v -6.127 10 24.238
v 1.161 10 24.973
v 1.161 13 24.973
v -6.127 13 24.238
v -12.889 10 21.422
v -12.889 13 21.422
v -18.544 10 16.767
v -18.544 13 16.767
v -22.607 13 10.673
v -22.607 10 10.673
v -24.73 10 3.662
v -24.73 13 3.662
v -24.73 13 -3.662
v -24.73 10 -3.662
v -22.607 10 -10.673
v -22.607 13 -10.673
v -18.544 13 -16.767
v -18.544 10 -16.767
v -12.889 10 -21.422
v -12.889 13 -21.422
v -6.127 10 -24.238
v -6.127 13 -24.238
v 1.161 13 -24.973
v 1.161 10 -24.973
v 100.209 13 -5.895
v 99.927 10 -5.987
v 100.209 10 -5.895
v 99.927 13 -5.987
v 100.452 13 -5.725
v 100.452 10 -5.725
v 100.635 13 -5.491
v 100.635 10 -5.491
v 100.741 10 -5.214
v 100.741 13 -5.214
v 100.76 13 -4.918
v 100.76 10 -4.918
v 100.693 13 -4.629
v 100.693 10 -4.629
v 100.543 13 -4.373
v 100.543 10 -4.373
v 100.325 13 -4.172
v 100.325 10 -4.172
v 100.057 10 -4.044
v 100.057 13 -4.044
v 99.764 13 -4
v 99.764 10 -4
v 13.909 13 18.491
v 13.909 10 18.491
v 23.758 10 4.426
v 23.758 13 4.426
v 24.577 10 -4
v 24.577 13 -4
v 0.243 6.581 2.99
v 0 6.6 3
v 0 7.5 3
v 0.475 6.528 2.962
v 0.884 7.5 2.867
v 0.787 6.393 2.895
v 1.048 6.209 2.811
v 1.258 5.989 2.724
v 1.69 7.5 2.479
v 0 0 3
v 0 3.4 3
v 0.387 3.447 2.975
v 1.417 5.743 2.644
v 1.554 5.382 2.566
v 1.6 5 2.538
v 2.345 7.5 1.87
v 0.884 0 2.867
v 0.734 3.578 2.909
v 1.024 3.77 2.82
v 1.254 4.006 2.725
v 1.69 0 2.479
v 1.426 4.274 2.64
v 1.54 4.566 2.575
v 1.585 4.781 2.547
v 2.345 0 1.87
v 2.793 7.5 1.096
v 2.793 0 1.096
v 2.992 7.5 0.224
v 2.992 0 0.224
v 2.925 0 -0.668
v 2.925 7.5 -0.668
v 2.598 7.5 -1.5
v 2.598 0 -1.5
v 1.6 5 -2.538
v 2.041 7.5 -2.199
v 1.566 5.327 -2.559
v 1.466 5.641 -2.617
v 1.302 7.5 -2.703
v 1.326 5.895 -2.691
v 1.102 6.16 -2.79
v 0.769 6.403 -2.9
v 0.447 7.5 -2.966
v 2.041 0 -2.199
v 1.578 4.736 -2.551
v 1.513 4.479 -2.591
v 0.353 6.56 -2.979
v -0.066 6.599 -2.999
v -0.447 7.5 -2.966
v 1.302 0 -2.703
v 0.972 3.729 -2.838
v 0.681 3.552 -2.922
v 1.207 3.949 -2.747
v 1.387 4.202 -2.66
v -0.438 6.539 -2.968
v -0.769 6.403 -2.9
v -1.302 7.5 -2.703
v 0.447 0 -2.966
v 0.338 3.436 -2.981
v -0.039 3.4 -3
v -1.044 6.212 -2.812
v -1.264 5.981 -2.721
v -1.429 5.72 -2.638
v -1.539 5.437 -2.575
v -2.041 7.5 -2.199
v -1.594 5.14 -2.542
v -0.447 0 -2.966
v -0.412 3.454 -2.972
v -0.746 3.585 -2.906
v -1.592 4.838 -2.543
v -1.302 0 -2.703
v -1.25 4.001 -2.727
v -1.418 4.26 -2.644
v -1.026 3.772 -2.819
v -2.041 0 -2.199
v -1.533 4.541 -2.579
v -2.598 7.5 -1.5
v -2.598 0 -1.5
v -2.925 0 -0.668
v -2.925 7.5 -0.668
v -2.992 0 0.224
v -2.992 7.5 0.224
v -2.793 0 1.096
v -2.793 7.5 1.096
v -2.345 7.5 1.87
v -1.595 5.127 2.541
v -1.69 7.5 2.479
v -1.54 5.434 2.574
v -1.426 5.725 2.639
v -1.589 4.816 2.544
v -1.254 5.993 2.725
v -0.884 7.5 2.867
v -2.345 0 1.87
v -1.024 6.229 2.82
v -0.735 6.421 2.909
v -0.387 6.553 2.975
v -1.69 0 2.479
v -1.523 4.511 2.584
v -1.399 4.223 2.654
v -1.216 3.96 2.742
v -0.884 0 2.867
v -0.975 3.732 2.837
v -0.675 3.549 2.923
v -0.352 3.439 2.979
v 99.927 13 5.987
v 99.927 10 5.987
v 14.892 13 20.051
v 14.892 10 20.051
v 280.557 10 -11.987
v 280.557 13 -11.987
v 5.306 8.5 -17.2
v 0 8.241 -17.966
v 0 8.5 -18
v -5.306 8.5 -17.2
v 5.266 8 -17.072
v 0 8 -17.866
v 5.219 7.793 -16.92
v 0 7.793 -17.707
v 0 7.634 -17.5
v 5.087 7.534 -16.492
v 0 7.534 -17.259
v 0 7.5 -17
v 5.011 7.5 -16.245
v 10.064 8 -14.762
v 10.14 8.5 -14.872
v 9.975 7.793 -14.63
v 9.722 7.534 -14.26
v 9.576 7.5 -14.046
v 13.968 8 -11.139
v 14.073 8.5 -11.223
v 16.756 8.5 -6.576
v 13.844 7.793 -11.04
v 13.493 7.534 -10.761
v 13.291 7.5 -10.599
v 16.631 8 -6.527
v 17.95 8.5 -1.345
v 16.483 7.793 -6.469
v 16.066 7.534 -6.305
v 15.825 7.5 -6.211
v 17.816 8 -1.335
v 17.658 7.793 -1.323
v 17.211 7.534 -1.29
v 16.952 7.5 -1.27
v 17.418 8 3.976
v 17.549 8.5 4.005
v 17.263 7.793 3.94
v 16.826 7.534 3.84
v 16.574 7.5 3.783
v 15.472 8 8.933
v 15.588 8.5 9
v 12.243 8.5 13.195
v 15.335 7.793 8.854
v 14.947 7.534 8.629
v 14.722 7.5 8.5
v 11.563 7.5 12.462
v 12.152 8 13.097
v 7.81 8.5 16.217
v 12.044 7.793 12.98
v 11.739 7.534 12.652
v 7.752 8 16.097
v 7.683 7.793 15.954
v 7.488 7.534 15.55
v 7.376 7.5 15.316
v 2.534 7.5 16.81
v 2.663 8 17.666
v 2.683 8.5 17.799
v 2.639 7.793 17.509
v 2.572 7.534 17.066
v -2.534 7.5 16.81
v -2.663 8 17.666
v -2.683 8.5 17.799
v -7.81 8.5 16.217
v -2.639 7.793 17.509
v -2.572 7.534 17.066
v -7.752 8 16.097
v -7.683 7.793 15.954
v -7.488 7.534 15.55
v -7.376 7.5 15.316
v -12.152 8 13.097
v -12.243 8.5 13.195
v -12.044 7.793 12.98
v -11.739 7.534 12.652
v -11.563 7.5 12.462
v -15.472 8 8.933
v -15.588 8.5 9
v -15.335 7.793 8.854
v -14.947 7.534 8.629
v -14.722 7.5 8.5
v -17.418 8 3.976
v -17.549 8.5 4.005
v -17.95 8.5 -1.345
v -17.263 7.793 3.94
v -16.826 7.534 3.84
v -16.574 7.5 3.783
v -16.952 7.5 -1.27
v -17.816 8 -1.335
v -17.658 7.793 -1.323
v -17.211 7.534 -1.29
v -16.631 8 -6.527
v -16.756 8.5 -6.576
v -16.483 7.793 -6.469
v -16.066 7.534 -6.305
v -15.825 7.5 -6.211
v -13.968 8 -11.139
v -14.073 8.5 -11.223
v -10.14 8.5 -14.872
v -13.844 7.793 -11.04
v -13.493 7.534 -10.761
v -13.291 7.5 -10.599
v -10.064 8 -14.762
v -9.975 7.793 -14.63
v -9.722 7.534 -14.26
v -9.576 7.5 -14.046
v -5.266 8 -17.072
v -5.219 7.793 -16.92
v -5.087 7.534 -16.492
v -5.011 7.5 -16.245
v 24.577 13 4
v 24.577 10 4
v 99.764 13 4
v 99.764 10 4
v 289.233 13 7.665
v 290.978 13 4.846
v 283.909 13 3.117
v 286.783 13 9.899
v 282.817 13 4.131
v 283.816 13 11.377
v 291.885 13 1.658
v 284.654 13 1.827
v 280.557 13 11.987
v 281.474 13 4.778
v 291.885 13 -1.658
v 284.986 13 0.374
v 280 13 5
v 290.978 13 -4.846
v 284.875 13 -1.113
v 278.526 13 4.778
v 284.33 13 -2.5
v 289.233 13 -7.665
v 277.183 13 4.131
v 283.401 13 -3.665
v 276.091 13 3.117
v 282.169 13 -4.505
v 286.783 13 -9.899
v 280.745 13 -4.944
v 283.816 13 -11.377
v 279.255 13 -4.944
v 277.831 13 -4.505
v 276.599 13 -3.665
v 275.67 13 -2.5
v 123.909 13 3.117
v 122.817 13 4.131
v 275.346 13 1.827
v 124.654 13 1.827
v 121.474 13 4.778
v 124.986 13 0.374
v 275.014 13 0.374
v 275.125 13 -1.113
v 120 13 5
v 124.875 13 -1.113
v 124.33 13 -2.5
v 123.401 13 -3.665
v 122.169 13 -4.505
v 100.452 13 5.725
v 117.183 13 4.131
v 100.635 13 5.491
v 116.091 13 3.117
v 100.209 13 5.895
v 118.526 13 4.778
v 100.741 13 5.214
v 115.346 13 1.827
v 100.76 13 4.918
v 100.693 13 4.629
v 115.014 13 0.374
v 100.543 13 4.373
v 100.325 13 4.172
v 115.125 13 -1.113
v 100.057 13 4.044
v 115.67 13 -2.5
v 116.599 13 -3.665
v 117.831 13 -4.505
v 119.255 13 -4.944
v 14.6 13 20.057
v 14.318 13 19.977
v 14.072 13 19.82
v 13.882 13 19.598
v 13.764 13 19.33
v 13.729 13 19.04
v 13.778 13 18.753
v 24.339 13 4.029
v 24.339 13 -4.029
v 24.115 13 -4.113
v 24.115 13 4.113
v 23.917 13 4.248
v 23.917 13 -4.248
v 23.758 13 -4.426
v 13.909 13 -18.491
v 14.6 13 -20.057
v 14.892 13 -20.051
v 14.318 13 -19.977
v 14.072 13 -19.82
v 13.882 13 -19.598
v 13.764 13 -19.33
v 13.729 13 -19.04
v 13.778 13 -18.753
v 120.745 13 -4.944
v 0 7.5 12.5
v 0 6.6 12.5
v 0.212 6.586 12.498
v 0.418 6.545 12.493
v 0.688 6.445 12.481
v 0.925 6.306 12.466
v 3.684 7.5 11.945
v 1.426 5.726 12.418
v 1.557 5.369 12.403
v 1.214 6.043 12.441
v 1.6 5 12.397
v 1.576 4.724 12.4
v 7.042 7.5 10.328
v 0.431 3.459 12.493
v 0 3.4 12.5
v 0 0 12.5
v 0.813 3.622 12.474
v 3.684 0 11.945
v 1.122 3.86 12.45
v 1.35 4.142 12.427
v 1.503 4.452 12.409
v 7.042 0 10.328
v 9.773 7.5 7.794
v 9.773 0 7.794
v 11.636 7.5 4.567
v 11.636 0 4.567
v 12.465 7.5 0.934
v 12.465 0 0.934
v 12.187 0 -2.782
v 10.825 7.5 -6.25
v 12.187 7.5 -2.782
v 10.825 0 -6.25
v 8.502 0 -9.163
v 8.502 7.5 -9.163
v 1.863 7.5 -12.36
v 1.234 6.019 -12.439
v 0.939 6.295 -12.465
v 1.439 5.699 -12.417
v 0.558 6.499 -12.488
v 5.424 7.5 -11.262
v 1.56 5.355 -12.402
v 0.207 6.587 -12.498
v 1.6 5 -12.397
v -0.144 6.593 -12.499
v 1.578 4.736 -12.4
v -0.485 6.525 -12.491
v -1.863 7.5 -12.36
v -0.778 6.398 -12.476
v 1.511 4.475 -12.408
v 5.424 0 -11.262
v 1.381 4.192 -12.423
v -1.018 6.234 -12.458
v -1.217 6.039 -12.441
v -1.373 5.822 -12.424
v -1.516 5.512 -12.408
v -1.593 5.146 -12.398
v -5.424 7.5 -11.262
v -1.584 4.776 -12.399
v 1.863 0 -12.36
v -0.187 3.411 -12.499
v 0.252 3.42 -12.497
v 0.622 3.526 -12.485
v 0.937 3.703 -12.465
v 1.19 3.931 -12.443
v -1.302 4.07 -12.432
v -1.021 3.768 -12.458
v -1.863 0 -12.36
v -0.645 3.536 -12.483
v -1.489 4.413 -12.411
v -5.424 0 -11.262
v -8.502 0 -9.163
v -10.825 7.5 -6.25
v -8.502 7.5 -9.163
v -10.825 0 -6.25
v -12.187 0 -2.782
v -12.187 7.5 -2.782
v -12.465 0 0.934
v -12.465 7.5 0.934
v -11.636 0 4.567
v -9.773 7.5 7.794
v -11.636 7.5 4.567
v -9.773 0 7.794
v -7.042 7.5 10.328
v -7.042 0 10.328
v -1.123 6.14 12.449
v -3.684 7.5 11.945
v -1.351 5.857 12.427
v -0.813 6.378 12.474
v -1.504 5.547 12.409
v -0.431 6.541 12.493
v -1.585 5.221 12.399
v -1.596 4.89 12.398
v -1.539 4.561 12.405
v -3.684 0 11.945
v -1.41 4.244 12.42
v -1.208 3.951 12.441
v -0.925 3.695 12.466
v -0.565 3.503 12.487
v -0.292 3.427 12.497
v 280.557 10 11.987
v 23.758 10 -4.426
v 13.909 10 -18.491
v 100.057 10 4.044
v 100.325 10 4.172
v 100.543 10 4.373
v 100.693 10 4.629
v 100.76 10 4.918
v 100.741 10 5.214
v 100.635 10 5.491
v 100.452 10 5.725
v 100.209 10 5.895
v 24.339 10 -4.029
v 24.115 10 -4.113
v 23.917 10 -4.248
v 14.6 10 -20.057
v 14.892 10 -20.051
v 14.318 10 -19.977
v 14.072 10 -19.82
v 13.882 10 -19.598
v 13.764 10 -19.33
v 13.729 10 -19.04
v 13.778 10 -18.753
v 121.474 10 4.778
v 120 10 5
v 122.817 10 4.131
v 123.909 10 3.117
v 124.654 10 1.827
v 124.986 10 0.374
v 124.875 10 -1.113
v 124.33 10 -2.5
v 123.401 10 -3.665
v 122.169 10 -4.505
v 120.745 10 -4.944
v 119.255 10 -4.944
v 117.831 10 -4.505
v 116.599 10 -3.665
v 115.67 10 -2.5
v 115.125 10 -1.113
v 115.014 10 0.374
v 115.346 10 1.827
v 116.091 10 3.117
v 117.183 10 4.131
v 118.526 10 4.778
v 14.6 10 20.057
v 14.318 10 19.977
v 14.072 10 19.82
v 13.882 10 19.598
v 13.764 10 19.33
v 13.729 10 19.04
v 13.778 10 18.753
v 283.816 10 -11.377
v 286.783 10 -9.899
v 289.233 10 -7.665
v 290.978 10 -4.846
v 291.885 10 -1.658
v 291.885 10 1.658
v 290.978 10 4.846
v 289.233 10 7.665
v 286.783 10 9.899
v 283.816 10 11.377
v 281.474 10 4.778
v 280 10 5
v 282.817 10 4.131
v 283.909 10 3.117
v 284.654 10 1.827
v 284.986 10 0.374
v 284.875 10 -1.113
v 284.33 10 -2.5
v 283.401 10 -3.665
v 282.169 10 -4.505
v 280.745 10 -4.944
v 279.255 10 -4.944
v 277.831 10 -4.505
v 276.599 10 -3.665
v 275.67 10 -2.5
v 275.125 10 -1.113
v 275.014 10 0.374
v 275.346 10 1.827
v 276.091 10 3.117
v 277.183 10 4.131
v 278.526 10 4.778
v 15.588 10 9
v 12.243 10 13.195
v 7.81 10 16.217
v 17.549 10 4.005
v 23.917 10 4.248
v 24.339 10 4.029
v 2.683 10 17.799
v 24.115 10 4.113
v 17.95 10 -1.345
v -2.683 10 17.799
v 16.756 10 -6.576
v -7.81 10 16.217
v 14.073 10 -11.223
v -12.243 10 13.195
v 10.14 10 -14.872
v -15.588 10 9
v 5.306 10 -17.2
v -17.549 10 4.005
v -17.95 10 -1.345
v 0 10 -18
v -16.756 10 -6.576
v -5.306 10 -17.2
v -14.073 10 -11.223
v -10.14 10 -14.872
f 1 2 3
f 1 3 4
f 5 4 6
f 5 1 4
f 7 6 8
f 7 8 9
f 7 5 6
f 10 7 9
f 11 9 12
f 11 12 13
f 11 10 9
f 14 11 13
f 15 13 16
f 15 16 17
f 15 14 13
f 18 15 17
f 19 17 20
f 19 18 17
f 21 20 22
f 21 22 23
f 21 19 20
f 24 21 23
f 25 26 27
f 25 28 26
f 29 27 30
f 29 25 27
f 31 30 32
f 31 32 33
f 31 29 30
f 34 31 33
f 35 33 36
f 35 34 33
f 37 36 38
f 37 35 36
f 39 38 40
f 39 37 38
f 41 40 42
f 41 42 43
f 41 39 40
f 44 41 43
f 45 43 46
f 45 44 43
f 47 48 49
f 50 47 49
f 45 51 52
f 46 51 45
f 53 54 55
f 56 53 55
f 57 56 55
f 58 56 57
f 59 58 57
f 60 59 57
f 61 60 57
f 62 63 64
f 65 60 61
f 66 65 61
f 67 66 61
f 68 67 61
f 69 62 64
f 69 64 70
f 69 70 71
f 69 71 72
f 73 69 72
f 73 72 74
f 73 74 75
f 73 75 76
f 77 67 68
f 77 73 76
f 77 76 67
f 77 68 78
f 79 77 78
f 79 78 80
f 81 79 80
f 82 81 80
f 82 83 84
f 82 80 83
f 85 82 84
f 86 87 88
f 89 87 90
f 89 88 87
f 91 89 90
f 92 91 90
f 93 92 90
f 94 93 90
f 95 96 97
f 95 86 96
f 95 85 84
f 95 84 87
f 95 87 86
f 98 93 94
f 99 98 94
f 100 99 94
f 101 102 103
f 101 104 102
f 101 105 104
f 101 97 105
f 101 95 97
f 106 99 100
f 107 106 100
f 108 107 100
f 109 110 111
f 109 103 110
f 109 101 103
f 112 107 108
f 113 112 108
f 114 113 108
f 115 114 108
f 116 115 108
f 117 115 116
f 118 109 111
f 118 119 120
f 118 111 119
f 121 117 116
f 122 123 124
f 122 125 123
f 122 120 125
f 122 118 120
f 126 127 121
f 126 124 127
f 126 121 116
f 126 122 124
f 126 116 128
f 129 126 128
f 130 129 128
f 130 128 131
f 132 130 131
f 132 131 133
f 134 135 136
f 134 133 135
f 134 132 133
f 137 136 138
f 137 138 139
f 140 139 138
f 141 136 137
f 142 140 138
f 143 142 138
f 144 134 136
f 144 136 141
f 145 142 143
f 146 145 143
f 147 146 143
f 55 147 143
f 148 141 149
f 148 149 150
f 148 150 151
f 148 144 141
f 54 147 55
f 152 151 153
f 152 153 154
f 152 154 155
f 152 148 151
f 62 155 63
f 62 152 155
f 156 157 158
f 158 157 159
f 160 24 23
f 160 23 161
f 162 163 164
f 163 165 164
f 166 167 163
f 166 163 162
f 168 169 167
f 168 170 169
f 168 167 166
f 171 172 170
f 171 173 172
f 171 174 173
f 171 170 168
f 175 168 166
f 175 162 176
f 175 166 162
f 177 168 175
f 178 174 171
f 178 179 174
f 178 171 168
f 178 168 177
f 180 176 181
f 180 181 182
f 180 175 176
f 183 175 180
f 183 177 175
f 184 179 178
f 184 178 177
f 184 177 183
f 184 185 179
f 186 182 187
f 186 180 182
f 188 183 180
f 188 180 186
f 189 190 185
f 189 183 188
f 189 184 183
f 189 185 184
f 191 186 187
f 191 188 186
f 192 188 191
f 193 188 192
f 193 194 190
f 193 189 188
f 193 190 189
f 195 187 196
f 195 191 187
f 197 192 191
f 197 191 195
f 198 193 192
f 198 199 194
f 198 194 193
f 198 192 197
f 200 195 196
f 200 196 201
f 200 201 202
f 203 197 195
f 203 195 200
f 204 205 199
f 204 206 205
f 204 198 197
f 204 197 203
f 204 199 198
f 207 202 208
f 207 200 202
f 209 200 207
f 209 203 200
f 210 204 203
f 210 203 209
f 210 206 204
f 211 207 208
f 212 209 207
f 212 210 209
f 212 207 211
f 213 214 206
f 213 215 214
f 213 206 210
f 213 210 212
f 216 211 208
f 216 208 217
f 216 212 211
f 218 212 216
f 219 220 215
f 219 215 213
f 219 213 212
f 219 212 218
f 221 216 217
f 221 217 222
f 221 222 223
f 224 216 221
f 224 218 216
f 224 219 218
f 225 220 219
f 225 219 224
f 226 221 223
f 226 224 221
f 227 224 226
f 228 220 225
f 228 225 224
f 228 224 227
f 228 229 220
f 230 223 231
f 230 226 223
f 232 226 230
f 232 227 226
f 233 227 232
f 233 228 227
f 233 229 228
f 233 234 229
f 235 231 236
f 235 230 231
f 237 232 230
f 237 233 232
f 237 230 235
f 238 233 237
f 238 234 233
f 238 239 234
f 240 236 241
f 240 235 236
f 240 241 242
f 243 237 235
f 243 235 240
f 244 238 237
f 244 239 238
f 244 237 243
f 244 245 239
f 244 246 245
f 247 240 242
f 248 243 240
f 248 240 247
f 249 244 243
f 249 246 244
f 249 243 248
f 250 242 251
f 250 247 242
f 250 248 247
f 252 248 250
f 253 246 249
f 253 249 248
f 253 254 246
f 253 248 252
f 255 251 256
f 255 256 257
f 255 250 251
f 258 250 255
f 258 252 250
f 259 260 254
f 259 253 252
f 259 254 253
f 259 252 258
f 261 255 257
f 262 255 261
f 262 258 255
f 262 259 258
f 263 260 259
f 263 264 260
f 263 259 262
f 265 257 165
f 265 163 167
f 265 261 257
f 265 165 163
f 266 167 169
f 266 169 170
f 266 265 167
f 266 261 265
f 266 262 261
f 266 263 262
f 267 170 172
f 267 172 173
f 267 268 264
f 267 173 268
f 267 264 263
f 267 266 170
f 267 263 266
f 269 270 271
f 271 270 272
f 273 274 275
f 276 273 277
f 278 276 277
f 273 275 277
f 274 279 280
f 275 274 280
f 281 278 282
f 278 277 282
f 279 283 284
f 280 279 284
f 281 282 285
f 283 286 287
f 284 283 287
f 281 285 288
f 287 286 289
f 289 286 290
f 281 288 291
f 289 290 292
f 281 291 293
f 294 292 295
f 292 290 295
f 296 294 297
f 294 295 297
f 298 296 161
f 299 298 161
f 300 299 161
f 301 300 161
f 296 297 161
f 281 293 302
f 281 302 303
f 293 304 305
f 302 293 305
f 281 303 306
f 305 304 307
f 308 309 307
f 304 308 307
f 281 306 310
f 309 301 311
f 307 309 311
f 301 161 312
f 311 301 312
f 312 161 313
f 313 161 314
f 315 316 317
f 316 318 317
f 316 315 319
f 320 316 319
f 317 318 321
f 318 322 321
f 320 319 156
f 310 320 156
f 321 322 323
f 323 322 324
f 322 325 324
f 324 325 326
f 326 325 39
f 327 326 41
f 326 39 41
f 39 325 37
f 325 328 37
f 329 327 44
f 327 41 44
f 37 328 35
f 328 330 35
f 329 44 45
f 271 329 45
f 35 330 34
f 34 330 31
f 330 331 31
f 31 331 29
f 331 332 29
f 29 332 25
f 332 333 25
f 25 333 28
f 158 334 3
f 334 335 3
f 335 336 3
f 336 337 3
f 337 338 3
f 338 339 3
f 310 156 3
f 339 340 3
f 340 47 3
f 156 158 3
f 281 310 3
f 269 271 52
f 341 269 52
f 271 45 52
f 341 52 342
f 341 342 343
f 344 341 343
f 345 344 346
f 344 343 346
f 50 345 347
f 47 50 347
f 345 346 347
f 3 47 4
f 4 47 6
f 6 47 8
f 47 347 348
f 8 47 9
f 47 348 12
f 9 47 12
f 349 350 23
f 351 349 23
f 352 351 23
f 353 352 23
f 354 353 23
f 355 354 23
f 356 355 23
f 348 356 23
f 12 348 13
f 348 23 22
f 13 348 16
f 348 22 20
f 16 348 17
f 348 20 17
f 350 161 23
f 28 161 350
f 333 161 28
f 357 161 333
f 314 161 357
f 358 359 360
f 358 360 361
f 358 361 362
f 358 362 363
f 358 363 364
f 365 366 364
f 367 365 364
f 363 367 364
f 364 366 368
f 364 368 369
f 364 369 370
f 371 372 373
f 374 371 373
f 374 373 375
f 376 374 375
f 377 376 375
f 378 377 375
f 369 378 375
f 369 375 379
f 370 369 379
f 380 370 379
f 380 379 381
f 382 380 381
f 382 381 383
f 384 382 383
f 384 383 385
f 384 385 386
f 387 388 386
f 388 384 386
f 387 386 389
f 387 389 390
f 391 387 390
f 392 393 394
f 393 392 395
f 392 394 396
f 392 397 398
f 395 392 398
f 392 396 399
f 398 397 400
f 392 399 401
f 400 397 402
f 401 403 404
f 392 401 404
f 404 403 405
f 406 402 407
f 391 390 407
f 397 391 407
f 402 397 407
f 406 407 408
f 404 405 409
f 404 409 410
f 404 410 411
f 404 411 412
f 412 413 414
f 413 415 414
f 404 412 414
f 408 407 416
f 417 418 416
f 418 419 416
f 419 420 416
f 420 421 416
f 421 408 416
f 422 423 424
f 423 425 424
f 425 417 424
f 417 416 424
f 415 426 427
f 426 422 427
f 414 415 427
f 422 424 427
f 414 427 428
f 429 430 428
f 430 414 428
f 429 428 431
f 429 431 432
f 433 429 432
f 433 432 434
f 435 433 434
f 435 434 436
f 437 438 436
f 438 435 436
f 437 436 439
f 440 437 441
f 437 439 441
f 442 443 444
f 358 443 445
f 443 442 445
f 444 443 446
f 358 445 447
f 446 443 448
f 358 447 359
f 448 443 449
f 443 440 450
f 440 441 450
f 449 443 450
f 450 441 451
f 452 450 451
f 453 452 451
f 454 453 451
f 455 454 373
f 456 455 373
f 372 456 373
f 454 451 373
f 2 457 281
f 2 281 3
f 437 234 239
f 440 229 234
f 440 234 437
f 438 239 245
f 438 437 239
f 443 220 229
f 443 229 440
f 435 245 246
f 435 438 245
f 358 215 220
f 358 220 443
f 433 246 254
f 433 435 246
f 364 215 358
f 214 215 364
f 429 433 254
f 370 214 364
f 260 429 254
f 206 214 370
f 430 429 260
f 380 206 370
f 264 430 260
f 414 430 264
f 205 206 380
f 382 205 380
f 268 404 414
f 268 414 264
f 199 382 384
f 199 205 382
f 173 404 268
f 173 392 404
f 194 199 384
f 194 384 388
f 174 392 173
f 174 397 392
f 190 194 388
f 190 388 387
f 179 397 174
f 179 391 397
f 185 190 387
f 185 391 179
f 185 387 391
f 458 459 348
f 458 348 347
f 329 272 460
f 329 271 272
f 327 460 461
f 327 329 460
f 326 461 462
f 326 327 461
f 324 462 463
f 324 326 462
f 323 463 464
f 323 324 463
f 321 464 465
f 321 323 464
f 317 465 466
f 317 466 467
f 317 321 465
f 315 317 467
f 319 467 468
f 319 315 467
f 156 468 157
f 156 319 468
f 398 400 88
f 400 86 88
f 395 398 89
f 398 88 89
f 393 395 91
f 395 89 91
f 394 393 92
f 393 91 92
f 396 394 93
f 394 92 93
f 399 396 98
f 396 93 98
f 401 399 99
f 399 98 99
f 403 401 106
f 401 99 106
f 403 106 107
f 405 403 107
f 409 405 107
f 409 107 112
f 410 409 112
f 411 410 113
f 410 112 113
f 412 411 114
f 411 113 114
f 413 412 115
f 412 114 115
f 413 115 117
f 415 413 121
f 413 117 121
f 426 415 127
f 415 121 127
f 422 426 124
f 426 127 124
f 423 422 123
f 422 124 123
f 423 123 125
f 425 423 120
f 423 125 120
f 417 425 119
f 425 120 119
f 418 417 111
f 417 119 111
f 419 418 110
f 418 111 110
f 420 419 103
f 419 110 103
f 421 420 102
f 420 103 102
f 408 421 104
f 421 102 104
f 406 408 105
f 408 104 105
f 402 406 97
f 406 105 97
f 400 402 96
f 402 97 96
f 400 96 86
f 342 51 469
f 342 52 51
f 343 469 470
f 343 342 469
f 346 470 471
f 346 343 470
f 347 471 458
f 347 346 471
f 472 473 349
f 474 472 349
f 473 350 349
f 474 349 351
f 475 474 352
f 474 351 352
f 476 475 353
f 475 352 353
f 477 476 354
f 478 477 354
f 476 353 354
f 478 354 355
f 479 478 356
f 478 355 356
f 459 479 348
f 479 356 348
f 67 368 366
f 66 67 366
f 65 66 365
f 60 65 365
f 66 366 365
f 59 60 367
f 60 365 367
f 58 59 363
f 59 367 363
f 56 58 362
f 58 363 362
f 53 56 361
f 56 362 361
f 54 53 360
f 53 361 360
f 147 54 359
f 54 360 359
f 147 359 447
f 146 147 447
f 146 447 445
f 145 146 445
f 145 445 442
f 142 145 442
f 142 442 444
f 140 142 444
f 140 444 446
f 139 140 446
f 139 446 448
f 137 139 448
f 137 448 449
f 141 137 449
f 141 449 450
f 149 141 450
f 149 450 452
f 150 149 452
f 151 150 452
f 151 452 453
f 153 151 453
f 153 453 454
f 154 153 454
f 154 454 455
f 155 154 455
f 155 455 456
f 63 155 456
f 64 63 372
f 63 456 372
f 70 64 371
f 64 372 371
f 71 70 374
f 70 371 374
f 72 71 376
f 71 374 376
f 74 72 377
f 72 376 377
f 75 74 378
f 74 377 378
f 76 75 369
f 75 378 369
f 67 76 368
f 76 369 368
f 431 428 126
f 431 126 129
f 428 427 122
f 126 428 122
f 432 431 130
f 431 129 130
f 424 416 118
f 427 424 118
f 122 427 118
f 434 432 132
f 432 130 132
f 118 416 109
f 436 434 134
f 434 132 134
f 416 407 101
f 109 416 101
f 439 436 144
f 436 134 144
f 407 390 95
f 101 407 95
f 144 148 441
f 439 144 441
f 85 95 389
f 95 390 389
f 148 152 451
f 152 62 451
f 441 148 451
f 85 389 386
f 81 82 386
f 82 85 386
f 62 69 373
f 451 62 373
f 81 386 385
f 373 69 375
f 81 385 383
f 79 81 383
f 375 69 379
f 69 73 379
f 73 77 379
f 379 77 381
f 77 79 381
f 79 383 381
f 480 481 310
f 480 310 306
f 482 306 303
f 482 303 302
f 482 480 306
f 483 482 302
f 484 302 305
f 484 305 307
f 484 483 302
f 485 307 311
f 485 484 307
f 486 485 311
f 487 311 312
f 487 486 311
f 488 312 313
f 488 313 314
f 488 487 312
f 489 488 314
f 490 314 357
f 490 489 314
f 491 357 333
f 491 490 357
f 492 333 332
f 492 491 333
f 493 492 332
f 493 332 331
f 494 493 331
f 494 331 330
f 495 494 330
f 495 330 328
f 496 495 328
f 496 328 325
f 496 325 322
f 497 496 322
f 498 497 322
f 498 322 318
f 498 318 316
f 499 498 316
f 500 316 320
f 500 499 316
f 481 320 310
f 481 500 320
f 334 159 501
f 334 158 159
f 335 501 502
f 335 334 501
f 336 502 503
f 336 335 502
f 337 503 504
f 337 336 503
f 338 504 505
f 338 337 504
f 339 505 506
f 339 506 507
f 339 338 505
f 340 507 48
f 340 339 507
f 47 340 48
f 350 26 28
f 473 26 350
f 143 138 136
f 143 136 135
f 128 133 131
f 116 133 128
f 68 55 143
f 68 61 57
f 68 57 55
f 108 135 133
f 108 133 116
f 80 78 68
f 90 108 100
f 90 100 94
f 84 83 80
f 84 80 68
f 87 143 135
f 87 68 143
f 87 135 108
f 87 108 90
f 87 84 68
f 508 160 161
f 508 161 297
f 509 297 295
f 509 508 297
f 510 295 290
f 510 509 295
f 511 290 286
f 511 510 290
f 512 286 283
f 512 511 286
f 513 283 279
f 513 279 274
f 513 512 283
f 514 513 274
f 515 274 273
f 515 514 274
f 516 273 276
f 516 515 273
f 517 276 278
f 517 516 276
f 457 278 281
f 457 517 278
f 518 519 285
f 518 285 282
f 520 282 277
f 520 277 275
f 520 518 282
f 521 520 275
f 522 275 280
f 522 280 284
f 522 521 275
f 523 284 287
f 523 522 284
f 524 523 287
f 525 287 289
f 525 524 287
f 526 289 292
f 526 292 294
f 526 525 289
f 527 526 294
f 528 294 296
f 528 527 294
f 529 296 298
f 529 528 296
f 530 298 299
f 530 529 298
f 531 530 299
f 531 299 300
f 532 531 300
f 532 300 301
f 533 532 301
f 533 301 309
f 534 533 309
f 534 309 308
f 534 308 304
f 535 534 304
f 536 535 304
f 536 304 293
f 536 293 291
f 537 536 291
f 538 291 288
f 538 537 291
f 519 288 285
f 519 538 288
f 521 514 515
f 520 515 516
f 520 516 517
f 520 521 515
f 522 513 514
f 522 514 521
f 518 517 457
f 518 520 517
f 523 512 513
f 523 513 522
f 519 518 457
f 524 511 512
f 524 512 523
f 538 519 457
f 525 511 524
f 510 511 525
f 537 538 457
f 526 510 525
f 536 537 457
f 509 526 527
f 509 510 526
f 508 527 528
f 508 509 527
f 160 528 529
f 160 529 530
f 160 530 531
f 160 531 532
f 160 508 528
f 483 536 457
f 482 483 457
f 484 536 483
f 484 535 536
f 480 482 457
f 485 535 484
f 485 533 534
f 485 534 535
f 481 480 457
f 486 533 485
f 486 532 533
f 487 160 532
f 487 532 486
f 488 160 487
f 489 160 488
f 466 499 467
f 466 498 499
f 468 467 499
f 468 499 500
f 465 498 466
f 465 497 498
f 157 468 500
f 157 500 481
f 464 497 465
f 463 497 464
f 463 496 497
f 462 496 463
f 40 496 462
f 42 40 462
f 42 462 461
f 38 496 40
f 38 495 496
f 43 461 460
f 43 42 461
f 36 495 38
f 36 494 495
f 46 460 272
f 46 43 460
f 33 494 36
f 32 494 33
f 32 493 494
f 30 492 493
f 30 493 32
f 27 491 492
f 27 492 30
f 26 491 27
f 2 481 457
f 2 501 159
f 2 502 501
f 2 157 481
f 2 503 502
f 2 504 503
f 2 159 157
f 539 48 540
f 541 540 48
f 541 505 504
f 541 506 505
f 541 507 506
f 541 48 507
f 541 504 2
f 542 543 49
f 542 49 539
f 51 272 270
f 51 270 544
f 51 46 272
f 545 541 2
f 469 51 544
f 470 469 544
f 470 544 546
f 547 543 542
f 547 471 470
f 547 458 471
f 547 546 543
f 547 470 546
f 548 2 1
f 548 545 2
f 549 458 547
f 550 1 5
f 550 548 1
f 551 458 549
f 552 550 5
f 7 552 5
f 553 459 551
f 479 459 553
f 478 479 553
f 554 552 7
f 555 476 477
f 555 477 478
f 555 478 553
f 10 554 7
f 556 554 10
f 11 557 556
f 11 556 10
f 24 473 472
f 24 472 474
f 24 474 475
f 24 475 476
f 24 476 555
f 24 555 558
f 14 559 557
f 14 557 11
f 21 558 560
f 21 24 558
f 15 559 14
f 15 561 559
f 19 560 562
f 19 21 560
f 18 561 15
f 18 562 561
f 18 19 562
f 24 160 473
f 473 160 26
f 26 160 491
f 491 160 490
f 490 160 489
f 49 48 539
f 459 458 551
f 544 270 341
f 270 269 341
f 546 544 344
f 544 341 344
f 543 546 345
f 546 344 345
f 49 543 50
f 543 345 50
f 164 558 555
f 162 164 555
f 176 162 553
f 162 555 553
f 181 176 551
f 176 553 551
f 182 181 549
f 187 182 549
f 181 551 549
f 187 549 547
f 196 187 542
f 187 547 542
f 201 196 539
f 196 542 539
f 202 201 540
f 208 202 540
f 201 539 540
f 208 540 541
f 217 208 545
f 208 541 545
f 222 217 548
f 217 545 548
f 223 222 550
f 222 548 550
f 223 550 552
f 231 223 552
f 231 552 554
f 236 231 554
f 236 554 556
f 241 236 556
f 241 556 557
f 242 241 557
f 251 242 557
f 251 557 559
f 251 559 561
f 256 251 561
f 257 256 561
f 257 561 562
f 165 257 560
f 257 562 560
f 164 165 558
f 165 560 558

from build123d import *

# Parameters (mm, degrees)
SKETCH_1_R          = 12.5
SKETCH_1_R_2        = 3
EXTRUDE_1_DEPTH     = 10
SKETCH_2_R          = 1.6
CUT_EXTRUDE_4_DEPTH = 12.5
SKETCH_3_R          = 5
EXTRUDE_2_DEPTH     = 3
SKETCH_4_R          = 18
EXTRUDE_3_DEPTH     = 2.5
FILLET_1_R          = 1
SKETCH_5_R          = 1
CUT_EXTRUDE_5_DEPTH = 3
FILLET_2_R          = 1


with BuildPart() as part:
    # 草图1 → 凸台-拉伸1 (new body)
    with BuildSketch(Plane(origin=(0, 0, 0), x_dir=(1, 0, 0), z_dir=(0, 1, 0))):
        with Locations(Location((0, 0, 0), (0, 0, 270))):
            Circle(SKETCH_1_R)
        with Locations(Location((0, 0, 0), (0, 0, 270))):
            Circle(SKETCH_1_R_2, mode=Mode.SUBTRACT)
    extrude(amount=EXTRUDE_1_DEPTH)

    # 草图2 → 切除-拉伸4 (cut, symmetric)
    with BuildSketch(Plane.XY):
        with Locations((0, 5)):
            Circle(SKETCH_2_R)
    extrude(amount=CUT_EXTRUDE_4_DEPTH, both=True, mode=Mode.SUBTRACT)

    # 草图3 → 凸台-拉伸2 (add)
    with BuildSketch(Plane(origin=(0, 10, 0), x_dir=(1, 0, 0), z_dir=(0, 1, 0))):
        with BuildLine():
            Line((1.160714286, 24.97304031), (280.557142857, 11.987059349))
            ThreePointArc((280.557142857, 11.987059349), (292, 0), (280.557142857, -11.987059349))
            Line((280.557142857, -11.987059349), (1.160714286, -24.97304031))
            ThreePointArc((1.160714286, -24.97304031), (-25, 0), (1.160714286, 24.97304031))
        make_face()
        with Locations(Location((280, 0, 0), (0, 0, 270))):
            Circle(SKETCH_3_R, mode=Mode.SUBTRACT)
        with Locations(Location((120, 0, 0), (0, 0, 270))):
            Circle(SKETCH_3_R, mode=Mode.SUBTRACT)
    extrude(amount=EXTRUDE_2_DEPTH)

    # 草图4 → 凸台-拉伸3 (add)
    with BuildSketch(Plane.XZ.offset(-10)):
        with Locations(Location((0, 0, 0), (0, 0, 270))):
            Circle(SKETCH_4_R)
    extrude(amount=EXTRUDE_3_DEPTH)

    # 圆角1
    fillet_1_edges = [part.edges().sort_by_distance(p)[0] for p in [
        (0, 7.5, 18),
    ]]
    fillet(fillet_1_edges, radius=FILLET_1_R)

    # 草图5 → 切除-拉伸5 (cut)
    with BuildSketch(Plane.XZ.offset(-10)):
        with Locations((120, 0)):
            Circle(SKETCH_5_R)
        Polygon((24.0562108, 4), (111.937742252, 4), (12.545084957, 20.439591429), align=None)
        Polygon((12.545084957, -20.439591429), (24.0562108, -4), (111.937742252, -4), align=None)
    extrude(amount=-CUT_EXTRUDE_5_DEPTH, mode=Mode.SUBTRACT)

    # 圆角2
    fillet_2_edges = [part.edges().sort_by_distance(p)[0] for p in [
        (24.0562108, 11.5, 4),
        (12.545084957, 11.5, 20.439591429),
        (111.937742252, 11.5, 4),
        (111.937742252, 11.5, -4),
        (12.545084957, 11.5, -20.439591429),
        (24.0562108, 11.5, -4),
    ]]
    fillet(fillet_2_edges, radius=FILLET_2_R)


solid = part.part
